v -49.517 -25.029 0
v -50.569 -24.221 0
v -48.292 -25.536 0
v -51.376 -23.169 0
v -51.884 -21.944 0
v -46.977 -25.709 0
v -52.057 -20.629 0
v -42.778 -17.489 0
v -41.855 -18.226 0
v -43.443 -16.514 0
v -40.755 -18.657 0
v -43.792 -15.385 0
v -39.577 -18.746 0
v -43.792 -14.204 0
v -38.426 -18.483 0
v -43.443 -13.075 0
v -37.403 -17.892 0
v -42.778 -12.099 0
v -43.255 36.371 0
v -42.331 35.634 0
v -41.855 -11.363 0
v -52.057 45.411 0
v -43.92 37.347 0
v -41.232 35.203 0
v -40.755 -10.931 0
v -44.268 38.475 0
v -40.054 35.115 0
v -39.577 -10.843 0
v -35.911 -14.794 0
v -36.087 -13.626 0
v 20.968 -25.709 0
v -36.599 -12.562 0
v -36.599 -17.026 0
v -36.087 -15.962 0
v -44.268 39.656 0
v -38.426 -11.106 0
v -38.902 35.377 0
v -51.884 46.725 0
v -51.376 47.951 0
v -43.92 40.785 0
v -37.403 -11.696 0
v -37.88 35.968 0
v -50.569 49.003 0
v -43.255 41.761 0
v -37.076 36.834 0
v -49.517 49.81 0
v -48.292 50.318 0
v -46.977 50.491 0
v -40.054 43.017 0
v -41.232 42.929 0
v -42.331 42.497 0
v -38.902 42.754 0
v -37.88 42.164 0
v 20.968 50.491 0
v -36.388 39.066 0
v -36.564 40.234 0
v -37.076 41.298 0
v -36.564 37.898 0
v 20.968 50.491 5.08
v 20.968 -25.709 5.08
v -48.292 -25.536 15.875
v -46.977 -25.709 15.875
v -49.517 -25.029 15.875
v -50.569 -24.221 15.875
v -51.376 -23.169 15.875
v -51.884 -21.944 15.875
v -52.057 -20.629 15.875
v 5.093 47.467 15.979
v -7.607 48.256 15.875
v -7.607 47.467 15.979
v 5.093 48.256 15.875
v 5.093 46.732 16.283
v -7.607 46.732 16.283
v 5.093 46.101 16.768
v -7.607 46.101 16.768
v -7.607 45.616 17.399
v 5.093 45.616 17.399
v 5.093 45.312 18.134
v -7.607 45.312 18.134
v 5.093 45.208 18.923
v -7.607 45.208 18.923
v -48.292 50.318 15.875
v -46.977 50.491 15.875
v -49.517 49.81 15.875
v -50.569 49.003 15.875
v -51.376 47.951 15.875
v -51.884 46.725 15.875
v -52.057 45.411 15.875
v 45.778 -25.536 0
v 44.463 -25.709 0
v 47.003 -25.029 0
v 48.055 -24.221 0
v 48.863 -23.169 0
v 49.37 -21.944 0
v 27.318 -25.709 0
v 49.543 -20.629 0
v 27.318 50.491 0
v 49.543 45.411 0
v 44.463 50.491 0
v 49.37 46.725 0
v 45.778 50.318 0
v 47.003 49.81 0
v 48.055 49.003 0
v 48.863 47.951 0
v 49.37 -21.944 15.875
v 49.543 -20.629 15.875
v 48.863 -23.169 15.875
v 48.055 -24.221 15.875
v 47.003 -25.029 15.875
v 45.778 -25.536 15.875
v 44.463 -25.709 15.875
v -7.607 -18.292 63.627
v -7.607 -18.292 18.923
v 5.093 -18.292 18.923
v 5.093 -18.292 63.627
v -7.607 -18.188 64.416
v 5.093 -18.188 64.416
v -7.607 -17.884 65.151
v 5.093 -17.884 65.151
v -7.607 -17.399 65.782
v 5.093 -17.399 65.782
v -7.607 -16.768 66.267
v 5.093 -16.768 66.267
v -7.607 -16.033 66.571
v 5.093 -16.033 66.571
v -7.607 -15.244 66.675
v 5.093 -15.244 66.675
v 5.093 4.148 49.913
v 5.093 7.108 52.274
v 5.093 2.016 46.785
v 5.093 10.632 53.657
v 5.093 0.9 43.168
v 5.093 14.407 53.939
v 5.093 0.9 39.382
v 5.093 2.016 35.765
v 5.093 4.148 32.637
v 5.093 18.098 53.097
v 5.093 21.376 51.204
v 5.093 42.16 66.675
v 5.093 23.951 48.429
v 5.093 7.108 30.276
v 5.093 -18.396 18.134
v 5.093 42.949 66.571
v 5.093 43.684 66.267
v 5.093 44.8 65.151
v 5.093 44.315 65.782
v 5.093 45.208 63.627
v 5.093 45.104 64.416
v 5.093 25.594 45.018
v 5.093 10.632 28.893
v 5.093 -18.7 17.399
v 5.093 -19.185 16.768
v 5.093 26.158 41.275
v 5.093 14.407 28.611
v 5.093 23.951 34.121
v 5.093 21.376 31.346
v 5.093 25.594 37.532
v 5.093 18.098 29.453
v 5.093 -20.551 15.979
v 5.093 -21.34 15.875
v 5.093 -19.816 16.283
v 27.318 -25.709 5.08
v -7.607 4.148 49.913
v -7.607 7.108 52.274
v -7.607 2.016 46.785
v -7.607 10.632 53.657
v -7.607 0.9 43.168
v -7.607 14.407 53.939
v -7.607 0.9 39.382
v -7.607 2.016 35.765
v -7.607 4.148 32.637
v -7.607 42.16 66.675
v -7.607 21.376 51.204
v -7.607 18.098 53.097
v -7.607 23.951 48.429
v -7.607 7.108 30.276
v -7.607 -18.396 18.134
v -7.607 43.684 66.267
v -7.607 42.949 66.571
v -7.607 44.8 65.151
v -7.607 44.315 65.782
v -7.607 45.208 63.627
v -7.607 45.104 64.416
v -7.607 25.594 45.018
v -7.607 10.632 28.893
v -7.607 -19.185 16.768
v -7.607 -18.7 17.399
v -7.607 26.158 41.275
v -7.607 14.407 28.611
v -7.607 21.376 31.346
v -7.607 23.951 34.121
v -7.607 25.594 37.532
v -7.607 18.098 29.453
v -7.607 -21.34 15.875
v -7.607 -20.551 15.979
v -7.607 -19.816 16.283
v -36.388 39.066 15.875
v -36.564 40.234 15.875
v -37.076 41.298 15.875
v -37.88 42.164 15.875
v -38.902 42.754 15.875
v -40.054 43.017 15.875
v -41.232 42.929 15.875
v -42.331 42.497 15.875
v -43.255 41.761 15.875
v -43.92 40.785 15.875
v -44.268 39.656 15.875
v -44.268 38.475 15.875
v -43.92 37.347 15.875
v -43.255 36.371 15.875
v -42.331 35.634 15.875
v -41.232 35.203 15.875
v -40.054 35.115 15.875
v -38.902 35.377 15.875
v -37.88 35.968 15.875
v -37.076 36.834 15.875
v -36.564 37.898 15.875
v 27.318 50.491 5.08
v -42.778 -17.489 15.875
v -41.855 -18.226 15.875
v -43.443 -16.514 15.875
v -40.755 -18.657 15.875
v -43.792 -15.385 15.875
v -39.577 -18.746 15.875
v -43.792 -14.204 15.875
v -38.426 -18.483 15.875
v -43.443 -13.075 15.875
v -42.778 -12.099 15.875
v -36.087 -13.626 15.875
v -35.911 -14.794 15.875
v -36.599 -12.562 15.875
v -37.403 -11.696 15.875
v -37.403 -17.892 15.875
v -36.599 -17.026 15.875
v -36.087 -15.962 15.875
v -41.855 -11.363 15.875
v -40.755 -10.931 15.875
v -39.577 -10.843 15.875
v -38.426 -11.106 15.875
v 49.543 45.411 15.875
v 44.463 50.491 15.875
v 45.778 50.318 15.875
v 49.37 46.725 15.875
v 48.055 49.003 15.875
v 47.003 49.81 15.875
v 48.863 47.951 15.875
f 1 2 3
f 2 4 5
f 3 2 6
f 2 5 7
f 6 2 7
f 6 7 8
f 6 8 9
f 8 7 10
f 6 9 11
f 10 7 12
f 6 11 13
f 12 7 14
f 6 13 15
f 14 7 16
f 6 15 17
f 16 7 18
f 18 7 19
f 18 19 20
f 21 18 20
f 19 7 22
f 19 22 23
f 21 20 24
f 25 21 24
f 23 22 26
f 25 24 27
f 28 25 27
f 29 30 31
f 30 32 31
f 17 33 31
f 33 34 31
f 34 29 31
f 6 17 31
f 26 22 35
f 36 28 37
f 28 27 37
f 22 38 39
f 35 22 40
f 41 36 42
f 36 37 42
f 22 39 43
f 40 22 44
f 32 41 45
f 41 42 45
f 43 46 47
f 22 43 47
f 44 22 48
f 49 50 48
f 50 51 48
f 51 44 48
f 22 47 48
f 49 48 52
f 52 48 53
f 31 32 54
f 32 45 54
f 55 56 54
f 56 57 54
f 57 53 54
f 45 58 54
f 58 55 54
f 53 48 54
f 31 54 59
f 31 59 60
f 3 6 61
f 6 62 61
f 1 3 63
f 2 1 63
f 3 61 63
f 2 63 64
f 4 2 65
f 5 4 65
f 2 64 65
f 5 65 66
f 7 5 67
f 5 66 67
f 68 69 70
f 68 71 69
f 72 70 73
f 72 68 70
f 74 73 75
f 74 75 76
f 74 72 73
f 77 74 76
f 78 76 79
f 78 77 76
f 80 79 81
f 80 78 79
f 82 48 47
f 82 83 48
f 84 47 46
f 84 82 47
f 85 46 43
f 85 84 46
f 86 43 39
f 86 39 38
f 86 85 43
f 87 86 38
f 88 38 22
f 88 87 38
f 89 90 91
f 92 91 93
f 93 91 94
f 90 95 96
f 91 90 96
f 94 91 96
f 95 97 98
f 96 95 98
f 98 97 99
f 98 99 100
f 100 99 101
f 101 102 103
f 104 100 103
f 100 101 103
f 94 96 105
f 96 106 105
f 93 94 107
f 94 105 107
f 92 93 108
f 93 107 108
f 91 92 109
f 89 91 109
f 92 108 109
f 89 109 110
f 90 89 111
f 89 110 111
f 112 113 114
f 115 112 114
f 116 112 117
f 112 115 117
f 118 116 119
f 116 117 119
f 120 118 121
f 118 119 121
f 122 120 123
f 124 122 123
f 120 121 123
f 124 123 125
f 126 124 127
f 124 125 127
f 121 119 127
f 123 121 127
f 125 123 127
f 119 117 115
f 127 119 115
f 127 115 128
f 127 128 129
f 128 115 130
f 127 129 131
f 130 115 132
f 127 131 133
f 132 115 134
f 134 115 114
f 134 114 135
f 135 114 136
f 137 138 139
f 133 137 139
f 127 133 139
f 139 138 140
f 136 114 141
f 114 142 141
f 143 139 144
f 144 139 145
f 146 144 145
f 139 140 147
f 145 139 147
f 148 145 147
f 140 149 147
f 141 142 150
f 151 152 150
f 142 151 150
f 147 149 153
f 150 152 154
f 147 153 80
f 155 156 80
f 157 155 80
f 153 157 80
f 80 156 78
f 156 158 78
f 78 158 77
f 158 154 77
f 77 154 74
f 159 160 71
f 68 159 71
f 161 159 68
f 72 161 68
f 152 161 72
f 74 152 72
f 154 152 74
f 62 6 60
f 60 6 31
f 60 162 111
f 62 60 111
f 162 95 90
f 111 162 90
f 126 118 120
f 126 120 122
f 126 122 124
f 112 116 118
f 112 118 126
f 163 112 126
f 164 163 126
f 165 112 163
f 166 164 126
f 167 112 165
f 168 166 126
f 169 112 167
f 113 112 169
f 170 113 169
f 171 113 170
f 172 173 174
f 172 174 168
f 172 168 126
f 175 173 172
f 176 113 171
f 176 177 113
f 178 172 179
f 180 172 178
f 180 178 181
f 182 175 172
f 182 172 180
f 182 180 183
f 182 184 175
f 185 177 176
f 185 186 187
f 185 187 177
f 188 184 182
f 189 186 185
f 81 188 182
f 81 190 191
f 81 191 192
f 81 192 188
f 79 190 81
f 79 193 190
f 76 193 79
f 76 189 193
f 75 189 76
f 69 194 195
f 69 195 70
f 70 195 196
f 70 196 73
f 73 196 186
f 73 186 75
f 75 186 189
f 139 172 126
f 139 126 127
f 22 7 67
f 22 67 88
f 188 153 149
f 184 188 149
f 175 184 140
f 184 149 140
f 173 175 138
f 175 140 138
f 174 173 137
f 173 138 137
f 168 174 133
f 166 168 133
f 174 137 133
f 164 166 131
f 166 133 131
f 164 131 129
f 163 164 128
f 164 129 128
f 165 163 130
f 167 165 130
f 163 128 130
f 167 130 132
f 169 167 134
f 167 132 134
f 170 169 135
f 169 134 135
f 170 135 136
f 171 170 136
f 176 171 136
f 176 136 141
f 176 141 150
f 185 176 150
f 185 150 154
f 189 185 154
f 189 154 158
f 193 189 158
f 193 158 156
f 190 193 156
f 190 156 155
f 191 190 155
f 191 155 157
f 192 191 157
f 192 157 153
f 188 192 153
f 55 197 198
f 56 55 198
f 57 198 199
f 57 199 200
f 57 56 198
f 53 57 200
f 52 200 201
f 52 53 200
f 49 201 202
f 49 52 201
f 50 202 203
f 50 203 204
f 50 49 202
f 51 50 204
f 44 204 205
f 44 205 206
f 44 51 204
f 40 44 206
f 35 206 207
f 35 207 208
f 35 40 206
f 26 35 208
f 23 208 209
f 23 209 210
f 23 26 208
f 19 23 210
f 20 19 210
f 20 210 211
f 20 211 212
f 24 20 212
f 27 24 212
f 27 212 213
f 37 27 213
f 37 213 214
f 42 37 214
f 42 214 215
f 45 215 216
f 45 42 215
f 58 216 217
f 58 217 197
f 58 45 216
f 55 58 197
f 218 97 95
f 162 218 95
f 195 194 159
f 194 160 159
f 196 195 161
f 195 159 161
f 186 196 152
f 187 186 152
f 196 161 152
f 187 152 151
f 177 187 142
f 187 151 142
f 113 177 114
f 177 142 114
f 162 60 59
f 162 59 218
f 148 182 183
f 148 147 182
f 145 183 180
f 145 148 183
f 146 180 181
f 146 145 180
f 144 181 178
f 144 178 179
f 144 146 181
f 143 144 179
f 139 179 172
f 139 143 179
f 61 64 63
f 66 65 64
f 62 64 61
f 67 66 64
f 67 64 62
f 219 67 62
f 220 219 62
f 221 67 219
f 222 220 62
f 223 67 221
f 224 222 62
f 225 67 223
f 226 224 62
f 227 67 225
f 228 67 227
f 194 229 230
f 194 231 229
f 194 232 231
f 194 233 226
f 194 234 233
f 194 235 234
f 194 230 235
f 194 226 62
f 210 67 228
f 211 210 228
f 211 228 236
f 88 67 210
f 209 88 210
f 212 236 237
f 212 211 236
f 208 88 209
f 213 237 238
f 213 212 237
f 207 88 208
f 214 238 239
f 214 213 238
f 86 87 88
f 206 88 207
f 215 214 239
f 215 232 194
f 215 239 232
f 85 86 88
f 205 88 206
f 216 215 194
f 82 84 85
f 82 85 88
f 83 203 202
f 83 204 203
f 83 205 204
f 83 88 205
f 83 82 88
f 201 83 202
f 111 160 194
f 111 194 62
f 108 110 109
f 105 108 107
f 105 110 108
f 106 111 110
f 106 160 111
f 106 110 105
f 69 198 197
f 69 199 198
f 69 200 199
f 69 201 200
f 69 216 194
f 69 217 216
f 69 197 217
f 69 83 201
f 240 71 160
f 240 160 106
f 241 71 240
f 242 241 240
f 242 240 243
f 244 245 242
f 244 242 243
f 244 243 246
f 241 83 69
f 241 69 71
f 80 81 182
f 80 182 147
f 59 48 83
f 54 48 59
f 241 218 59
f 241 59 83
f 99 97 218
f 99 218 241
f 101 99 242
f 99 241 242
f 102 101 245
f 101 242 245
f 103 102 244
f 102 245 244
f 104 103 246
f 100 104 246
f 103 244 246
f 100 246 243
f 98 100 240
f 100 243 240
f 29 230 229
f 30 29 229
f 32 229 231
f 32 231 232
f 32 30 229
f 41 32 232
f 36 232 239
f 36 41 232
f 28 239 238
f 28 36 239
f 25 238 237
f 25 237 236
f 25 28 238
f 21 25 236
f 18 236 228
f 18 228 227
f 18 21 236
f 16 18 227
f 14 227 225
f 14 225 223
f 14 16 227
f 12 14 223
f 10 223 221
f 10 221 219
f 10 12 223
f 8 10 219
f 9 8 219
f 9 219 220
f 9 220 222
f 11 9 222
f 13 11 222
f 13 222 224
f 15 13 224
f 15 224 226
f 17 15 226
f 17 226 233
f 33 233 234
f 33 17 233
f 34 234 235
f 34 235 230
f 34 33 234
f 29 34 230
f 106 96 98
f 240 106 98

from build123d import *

# Parameters (mm, degrees)
F0_W     = 12.7
F0_H     = 63.5
F1_DEPTH = 66.675
F0_W_2   = 101.6
F0_H_2   = 76.2
F0_R     = 3.9624
F2_DEPTH = 15.875
F3_R     = 3.048
F4_R     = 5.08
F6_W     = 6.35
F6_H     = 76.2
F7_DEPTH = 5.08
F5_R     = 12.7
F8_DEPTH = 37.592


with BuildPart() as f1:
    # F0 (on Top) → F1 (new body)
    with BuildSketch(Plane.XY):
        with Locations((-1.256721, 13.457914)):
            Rectangle(F0_W, F0_H)
    extrude(amount=F1_DEPTH)

    # F0 (on Top) → F2 (join)
    with BuildSketch(Plane.XY):
        with Locations((-1.256721, 12.390629)):
            Rectangle(F0_W_2, F0_H_2)
        with Locations((-39.873372, -14.794378)):
            Circle(F0_R, mode=Mode.SUBTRACT)
        with Locations((-40.350091, 39.065836)):
            Circle(F0_R, mode=Mode.SUBTRACT)
        with Locations((-1.256721, 13.457914)):
            Rectangle(F0_W, F0_H, mode=Mode.SUBTRACT)
    extrude(amount=F2_DEPTH)

    # F3
    f3_edges = [f1.edges().sort_by_distance(p)[0] for p in [
        (-1.256721, -18.292086, 66.675),
        (-1.256721, 45.207914, 66.675),
        (-1.256721, -18.292086, 15.875),
        (-1.256721, 45.207914, 15.875),
    ]]
    fillet(f3_edges, radius=F3_R)

    # F4
    f4_edges = [f1.edges().sort_by_distance(p)[0] for p in [
        (-52.056721, -25.709371, 7.9375),
        (49.543279, -25.709371, 7.9375),
        (49.543279, 50.490629, 7.9375),
        (-52.056721, 50.490629, 7.9375),
    ]]
    fillet(f4_edges, radius=F4_R)

    # F6 (on face) → F7 (cut)
    with BuildSketch(Plane(origin=(0, 0, 0), x_dir=(1, 0, 0), z_dir=(0, 0, -1))):
        with Locations((24.143279, -12.390629)):
            Rectangle(F6_W, F6_H)
    extrude(amount=-F7_DEPTH, mode=Mode.SUBTRACT)

    # F5 (on face) → F8 (cut)
    with BuildSketch(Plane.YZ.offset(5.093279)):
        with Locations((13.457914, 41.275)):
            Circle(F5_R)
    extrude(amount=-F8_DEPTH, mode=Mode.SUBTRACT)


solid = f1.part
